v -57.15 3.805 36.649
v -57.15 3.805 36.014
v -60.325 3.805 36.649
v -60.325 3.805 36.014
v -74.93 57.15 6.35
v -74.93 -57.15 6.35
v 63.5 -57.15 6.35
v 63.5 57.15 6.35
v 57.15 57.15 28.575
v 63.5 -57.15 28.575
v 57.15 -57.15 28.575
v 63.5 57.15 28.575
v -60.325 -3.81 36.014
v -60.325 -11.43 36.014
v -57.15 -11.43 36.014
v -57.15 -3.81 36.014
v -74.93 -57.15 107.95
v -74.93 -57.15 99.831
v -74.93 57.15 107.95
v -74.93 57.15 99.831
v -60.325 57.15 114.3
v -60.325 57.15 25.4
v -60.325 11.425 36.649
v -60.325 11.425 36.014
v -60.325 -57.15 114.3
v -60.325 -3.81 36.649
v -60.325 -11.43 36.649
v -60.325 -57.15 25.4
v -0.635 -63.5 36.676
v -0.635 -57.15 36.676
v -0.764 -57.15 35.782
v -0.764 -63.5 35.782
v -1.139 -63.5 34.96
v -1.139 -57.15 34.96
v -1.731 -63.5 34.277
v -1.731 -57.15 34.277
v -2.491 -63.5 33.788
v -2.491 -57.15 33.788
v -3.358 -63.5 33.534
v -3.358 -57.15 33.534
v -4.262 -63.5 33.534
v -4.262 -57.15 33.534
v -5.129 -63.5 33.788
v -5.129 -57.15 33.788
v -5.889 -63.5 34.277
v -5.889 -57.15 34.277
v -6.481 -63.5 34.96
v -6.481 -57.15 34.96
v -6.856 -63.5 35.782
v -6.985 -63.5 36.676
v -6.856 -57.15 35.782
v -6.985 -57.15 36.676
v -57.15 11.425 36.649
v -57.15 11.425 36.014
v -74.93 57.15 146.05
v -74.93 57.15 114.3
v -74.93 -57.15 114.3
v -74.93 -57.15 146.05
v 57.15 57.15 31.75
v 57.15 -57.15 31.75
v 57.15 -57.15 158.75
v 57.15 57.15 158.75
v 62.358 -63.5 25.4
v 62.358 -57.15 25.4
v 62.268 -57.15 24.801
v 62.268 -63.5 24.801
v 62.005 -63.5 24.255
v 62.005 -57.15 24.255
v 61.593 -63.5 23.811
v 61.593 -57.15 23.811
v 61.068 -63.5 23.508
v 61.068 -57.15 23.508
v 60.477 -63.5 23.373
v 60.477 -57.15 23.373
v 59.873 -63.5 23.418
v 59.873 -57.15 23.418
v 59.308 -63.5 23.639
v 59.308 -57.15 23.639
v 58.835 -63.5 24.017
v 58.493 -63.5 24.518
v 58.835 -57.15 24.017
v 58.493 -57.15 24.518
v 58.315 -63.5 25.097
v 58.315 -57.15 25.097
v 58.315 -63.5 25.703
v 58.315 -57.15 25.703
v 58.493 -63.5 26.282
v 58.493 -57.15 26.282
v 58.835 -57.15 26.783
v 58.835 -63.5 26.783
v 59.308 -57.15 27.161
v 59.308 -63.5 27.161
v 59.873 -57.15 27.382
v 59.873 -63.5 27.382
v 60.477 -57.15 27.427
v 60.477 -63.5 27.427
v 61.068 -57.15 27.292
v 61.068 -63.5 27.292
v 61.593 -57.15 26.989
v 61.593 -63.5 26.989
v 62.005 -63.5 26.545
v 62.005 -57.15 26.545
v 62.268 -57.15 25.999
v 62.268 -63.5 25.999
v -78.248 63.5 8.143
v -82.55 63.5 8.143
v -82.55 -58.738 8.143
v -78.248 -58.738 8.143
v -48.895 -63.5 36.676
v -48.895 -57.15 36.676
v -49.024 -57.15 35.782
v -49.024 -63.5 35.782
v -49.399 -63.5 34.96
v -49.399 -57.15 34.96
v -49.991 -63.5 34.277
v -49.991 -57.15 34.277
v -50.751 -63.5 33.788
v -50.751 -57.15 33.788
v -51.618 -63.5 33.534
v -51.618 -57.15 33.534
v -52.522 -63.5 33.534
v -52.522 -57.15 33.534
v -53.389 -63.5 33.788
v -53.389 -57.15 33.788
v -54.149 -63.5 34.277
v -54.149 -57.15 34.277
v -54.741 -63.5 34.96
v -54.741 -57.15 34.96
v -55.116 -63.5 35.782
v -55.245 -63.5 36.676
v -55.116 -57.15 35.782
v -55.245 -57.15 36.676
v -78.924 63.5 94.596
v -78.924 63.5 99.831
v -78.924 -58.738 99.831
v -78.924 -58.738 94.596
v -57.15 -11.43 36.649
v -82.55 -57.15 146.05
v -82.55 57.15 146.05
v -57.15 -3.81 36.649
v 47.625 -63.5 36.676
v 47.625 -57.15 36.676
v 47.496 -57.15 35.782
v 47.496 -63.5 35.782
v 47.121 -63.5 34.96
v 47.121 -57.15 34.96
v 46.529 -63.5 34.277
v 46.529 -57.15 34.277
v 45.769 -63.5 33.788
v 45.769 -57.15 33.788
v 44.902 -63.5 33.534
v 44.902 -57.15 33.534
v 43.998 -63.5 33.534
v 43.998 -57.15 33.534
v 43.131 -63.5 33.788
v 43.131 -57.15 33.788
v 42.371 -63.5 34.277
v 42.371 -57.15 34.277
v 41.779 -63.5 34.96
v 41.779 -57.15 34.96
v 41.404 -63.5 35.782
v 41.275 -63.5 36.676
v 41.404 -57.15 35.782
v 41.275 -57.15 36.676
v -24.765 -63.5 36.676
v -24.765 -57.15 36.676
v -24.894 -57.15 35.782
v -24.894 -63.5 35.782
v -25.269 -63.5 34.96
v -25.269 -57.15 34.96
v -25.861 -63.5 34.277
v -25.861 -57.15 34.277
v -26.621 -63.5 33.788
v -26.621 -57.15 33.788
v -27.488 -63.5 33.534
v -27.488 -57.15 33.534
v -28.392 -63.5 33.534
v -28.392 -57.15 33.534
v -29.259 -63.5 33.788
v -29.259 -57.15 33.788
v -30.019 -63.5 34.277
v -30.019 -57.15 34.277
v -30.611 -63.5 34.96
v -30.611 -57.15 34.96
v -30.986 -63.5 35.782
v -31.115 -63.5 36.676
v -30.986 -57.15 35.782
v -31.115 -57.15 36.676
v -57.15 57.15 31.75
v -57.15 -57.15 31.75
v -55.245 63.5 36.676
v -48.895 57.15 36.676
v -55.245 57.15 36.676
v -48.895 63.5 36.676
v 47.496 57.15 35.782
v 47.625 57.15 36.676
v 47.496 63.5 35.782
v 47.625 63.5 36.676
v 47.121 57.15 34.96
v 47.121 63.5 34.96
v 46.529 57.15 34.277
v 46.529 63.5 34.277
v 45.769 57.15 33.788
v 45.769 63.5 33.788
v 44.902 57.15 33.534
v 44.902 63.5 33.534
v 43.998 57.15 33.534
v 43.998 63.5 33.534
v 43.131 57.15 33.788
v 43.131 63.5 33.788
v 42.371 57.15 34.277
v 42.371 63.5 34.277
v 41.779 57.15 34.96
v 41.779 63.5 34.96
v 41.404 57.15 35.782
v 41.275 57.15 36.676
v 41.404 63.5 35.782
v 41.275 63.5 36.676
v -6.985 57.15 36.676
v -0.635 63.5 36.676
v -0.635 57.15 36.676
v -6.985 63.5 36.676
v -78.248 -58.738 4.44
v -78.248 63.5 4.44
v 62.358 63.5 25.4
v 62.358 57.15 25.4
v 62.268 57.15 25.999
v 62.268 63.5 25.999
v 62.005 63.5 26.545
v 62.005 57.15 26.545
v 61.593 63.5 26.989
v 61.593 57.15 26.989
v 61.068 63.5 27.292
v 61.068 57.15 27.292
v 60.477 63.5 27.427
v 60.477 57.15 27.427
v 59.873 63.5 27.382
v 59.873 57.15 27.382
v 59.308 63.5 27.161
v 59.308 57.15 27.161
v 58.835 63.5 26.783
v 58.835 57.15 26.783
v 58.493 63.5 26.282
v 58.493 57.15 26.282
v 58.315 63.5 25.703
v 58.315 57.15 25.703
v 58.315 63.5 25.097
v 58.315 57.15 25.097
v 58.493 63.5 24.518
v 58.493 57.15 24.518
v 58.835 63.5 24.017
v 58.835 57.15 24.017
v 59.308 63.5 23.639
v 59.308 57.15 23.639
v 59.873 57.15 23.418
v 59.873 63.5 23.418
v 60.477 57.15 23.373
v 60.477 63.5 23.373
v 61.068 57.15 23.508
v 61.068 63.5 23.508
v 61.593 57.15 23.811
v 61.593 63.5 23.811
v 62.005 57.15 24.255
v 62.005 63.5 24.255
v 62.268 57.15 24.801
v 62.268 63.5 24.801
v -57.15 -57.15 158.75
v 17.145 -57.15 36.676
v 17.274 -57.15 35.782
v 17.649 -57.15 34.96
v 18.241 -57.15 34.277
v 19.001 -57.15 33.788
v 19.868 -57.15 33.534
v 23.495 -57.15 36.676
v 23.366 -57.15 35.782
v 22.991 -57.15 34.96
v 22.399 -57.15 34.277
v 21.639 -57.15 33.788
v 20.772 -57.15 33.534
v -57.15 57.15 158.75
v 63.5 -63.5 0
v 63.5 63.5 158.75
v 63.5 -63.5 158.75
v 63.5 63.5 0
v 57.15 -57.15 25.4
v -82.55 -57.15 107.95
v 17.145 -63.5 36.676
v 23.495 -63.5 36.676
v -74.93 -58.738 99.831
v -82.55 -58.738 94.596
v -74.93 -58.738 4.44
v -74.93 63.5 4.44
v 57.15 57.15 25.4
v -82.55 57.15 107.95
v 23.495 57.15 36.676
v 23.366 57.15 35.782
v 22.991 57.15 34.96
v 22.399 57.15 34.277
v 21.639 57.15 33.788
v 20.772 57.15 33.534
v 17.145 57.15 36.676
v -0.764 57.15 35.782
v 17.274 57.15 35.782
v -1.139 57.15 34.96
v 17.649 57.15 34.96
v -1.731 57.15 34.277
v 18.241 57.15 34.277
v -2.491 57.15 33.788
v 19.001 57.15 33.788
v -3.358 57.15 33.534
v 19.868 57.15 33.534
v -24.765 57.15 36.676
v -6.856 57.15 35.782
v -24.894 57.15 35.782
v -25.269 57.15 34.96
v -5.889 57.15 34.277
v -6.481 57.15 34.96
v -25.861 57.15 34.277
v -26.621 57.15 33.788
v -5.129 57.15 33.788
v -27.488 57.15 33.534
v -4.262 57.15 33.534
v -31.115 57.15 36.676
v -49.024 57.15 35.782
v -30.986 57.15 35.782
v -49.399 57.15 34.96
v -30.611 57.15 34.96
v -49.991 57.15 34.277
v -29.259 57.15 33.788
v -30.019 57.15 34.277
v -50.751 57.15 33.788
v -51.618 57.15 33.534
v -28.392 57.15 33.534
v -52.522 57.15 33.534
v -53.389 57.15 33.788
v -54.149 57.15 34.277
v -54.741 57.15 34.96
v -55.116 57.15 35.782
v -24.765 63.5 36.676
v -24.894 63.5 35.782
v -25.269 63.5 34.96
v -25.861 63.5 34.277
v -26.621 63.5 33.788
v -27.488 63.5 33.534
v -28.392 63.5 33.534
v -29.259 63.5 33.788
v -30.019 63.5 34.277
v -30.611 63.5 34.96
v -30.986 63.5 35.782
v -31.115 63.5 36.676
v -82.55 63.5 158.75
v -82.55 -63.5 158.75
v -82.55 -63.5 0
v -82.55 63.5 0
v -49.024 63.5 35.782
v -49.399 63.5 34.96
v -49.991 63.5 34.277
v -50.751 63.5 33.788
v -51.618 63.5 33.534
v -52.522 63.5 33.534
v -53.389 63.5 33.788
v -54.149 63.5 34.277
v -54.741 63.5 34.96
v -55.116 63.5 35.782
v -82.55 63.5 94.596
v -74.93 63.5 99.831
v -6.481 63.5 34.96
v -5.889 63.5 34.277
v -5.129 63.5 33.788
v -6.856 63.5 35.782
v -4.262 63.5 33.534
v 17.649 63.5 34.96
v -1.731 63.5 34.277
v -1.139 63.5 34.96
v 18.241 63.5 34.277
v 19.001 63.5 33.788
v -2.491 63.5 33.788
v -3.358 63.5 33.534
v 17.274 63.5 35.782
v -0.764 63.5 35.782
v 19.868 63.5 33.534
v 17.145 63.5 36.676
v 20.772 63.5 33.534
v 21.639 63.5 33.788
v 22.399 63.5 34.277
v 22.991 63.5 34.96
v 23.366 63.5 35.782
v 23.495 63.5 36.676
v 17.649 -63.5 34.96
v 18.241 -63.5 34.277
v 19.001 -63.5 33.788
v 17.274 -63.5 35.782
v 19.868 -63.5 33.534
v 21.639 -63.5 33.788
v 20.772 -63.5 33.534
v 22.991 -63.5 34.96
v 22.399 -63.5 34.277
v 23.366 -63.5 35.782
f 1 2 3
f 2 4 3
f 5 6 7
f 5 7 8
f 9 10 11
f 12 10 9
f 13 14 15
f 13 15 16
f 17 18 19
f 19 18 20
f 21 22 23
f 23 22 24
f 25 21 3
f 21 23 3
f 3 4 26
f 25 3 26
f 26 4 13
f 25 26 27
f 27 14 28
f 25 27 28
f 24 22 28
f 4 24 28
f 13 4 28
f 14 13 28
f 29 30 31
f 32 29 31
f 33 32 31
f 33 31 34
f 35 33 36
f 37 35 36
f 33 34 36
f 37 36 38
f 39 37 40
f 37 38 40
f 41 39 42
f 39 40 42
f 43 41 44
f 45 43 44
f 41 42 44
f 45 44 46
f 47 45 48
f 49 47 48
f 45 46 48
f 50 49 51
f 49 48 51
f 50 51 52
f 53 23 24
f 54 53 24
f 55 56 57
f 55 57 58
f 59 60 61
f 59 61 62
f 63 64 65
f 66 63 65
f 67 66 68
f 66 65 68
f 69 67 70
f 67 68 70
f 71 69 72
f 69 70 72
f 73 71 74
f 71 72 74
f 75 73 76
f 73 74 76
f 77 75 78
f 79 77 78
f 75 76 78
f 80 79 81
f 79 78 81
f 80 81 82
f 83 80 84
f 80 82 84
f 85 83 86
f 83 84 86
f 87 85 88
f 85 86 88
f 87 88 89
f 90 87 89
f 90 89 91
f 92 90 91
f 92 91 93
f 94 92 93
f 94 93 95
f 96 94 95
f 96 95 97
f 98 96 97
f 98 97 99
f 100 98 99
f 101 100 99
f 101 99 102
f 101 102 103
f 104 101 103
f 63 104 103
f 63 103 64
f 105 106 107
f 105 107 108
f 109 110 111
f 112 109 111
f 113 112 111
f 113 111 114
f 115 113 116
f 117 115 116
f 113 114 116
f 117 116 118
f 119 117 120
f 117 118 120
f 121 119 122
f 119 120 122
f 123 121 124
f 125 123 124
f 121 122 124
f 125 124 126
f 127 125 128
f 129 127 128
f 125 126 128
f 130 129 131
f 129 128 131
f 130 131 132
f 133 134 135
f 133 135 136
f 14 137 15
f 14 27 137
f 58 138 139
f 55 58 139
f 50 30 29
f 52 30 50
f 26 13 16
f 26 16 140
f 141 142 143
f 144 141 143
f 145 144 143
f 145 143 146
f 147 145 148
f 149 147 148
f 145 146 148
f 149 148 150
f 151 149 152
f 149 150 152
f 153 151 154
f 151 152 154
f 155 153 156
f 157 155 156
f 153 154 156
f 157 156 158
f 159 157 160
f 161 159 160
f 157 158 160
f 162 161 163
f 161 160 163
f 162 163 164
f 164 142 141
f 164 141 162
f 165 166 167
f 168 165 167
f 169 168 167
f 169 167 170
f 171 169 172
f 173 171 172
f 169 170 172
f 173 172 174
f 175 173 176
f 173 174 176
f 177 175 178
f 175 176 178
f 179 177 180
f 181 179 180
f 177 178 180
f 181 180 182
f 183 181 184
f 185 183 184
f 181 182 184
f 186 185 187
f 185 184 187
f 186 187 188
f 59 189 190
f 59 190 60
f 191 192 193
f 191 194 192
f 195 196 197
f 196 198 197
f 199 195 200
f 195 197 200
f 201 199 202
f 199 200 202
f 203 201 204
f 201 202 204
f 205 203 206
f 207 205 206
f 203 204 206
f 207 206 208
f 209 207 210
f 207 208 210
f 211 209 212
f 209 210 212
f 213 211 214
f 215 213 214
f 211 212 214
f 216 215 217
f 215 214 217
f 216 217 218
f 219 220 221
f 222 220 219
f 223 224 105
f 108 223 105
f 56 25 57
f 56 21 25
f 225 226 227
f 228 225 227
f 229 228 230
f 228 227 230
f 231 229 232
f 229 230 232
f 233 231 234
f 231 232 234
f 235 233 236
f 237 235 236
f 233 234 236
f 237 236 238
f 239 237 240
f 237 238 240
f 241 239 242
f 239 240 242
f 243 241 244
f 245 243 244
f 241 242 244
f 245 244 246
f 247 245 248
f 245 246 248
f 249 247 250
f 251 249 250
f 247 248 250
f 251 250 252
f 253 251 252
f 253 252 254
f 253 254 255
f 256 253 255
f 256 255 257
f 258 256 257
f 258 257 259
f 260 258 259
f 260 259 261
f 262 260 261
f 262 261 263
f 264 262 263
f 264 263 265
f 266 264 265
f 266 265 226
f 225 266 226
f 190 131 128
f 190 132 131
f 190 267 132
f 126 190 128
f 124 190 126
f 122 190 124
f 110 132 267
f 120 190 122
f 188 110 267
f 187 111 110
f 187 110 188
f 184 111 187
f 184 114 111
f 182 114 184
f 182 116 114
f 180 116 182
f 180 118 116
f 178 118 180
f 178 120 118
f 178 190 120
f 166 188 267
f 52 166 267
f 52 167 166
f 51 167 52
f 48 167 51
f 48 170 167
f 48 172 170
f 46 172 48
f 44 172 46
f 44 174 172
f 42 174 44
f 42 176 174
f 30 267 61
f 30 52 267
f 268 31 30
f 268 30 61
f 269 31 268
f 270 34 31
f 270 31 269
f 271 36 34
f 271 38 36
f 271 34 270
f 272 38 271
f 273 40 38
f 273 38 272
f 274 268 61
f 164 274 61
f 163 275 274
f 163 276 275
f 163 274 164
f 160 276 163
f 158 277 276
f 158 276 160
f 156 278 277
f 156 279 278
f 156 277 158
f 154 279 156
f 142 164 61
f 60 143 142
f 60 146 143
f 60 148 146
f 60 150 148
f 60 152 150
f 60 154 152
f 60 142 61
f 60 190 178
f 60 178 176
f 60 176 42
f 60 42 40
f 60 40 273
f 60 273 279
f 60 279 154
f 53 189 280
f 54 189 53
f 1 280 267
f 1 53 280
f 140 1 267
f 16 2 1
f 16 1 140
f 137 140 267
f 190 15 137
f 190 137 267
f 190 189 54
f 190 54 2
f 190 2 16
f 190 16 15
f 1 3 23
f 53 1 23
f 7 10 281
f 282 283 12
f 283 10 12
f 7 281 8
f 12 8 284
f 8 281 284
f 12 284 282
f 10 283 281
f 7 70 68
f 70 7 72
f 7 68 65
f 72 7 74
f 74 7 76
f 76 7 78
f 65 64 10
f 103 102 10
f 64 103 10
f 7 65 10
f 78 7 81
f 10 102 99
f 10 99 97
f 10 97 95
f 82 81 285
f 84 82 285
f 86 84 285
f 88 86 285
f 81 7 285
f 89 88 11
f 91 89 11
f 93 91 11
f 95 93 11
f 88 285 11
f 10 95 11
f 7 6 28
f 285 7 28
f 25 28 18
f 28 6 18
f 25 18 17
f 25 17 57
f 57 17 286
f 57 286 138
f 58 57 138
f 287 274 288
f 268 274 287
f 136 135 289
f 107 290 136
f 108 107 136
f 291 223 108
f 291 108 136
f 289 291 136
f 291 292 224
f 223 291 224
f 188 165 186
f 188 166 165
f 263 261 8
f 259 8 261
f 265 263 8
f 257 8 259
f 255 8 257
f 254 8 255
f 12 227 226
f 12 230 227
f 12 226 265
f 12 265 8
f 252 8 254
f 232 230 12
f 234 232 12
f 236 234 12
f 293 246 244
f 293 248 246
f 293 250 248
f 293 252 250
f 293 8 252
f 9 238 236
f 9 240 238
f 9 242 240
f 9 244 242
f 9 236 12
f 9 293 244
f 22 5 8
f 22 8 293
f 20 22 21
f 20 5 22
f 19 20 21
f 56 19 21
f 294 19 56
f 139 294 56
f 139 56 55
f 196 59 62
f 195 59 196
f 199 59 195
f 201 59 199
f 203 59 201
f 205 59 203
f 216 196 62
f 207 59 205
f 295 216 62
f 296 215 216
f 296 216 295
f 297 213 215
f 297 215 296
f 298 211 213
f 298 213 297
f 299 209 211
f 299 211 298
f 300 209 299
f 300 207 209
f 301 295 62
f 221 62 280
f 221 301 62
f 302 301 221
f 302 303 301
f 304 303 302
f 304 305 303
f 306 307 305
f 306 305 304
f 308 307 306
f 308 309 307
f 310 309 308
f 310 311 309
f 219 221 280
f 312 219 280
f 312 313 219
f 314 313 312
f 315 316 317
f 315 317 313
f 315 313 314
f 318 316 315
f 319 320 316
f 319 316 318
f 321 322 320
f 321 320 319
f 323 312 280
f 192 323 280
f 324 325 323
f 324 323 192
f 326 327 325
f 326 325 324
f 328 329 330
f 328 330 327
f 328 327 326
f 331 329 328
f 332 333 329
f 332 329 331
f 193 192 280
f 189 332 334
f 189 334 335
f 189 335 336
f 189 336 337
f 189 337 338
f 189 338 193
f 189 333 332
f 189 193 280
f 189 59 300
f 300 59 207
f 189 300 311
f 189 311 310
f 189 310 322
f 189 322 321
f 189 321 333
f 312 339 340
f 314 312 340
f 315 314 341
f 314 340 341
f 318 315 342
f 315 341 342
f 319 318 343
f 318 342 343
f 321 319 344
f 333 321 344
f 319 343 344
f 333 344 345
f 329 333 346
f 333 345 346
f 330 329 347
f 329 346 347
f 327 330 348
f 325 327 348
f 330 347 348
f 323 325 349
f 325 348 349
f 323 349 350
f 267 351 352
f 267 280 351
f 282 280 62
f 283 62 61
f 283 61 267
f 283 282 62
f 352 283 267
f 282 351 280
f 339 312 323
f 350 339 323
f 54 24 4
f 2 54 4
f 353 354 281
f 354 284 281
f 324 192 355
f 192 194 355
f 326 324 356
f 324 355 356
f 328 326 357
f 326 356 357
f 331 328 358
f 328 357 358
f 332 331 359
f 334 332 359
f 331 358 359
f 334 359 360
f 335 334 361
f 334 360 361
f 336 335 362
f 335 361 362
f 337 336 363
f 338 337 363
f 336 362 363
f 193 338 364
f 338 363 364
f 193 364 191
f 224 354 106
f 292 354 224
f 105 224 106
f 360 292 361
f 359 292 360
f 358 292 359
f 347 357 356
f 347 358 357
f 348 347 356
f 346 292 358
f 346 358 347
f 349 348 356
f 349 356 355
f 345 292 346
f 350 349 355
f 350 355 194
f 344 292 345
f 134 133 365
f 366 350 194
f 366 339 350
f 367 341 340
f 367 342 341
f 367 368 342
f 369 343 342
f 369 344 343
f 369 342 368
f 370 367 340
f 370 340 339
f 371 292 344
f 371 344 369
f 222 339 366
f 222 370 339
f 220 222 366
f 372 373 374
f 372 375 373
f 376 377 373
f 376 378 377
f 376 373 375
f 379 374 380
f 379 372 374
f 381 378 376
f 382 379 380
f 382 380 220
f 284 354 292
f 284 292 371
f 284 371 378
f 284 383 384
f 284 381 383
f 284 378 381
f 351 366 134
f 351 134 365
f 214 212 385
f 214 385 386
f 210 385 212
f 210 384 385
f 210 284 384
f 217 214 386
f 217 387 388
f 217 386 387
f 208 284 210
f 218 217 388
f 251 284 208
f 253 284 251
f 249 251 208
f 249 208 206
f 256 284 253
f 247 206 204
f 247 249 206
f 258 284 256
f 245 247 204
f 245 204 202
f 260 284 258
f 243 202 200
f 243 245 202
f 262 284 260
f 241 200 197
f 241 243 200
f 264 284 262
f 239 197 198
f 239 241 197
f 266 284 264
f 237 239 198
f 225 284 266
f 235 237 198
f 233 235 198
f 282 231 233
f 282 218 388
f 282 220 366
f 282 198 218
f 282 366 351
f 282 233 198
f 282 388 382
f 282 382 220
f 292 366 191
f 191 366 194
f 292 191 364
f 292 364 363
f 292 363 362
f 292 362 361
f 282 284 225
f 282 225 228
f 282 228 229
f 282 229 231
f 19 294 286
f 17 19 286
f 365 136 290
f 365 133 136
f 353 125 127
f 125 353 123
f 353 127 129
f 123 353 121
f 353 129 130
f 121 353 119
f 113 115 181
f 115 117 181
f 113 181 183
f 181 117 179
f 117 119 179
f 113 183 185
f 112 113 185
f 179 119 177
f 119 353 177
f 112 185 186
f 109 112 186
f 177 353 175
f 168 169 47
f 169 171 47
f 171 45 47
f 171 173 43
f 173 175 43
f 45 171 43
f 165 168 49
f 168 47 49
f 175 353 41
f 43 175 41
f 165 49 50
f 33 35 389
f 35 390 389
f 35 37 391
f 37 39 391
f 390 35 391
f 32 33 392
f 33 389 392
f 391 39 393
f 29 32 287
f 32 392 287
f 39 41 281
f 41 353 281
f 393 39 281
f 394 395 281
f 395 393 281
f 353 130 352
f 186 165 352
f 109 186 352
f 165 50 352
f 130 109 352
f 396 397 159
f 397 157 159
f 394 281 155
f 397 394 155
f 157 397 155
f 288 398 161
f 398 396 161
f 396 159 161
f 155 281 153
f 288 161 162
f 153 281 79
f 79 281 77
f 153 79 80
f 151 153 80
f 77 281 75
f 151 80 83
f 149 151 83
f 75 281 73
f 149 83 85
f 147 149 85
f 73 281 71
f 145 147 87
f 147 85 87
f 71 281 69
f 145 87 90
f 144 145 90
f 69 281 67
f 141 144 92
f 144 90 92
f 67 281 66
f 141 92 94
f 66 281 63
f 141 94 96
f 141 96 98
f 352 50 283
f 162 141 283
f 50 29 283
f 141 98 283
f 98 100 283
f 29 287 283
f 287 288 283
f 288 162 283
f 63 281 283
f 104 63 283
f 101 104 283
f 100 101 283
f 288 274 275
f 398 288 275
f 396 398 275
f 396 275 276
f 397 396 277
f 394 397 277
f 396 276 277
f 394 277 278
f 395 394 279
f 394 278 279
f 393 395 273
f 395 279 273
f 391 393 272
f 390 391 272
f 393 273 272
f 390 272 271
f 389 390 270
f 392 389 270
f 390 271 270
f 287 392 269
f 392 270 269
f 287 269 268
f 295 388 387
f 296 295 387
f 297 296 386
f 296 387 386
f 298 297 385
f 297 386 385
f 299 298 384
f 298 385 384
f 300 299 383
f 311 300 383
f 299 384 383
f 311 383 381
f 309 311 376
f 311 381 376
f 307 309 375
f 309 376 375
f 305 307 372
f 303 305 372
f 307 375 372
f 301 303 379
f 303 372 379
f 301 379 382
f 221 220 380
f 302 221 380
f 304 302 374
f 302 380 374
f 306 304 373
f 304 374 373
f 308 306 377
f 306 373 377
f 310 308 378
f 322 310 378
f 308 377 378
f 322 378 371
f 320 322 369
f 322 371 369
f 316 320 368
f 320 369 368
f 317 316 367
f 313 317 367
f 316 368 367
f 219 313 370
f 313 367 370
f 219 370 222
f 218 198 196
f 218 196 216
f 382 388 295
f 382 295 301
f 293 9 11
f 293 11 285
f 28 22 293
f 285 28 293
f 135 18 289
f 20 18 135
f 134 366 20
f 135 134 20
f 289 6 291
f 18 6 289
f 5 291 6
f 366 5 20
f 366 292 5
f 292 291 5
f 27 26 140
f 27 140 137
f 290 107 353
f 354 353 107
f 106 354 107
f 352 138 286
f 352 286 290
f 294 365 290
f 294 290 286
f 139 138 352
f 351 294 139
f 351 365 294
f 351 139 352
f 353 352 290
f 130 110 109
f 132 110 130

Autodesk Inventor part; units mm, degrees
ref_plane "YZ Plane" through (0, 0, 0) normal (1, 0, 0) x (0, 1, 0)
ref_plane "XZ Plane" through (0, 0, 0) normal (0, 1, 0) x (-1, 0, 0)
ref_plane "XY Plane" through (0, 0, 0) normal (0, 0, 1) x (1, 0, 0)
sketch "Sketch1" plane through (0, 0, 0) normal (0, 0, 1) x (1, 0, 0)
  circle A0 centre (0, 0) radius 107.95 projected
  circle A1 centre (0, 0) radius 114.3 projected
  circle A2 centre (0, 0) radius 107.95 projected
  circle A3 centre (0, 0) radius 107.95 projected
  line L0 (-63.5, -63.5) -> (63.5, -63.5)
  line L1 (63.5, -63.5) -> (63.5, 63.5)
  line L2 (63.5, 63.5) -> (-63.5, 63.5)
  line L3 (-63.5, 63.5) -> (-63.5, -63.5)
  line L4 (-63.5, -63.5) -> (63.5, 63.5) construction
  line L5 (63.5, -63.5) -> (-63.5, 63.5) construction
  line L6 (57.15, 57.15) -> (57.15, -57.15)
  line L7 (57.15, -57.15) -> (-57.15, -57.15)
  line L8 (-57.15, -57.15) -> (-57.15, 57.15)
  line L9 (-57.15, 57.15) -> (57.15, 57.15)
  dimension "d0" = 127
  dimension "d1" = 127
  dimension "d2" = 6.35
extrude "Extrusion1" add sketch "Sketch1" along normal blind 6.35 contours L3 L2 L1 L0 | L6 L7 L8 L9
sketch "Sketch2" plane through (0, 0, 6.35) normal (0, 0, 1) x (1, 0, 0)
  line L0 (63.5, -63.5) -> (63.5, 63.5) projected
  line L1 (-63.5, 63.5) -> (63.5, 63.5)
  line L2 (63.5, 63.5) -> (63.5, -63.5)
  line L3 (63.5, -63.5) -> (-63.5, -63.5)
  line L4 (-63.5, -63.5) -> (-63.5, 63.5)
  line L5 (-63.5, 63.5) -> (63.5, -63.5) construction
  line L6 (63.5, 63.5) -> (-63.5, -63.5) construction
  line L7 (-57.15, -57.15) -> (57.15, -57.15)
  line L8 (57.15, -57.15) -> (57.15, 57.15)
  line L9 (57.15, 57.15) -> (-57.15, 57.15)
  line L10 (-57.15, 57.15) -> (-57.15, -57.15)
  point P0 (0, 0)
  dimension "d5" = 6.35
extrude "Extrusion2" add sketch "Sketch2" along normal blind 152.4
sketch "Sketch3" plane through (-63.5, -63.5, 0) normal (-1, 0, 0) x (0, 0, 1)
  line L0 (0, 127) -> (0, 0) projected
  line L1 (0, 0) -> (158.75, 0) projected
  line L2 (158.75, 127) -> (158.75, 0) projected
  line L3 (0, 127) -> (158.75, 127) projected
  point P0 (0, 63.5)
extrude "Extrusion3" add sketch "Sketch3" along normal blind 19.05
sketch "Sketch4" plane through (-82.55, -63.5, 0) normal (-1, 0, 0) x (0, 0, 1)
  line L0 (107.95, 6.35) -> (146.05, 6.35)
  line L1 (146.05, 6.35) -> (146.05, 120.65)
  line L2 (146.05, 120.65) -> (107.95, 120.65)
  line L3 (107.95, 120.65) -> (107.95, 6.35)
  line L4 (107.95, 6.35) -> (146.05, 120.65) construction
  line L5 (146.05, 6.35) -> (107.95, 120.65) construction
  line L6 (158.75, 127) -> (0, 127) projected
  line L7 (0, 0) -> (158.75, 0) projected
  line L8 (158.75, 0) -> (158.75, 127) projected
  point P0 (0, 63.5)
  point P1 (127, 63.5)
  dimension "d10" = 38.1
  dimension "d11" = 114.3
  dimension "d12" = 6.35
  dimension "d13" = 6.35
  dimension "d14" = 12.7
extrude "Extrusion4" cut sketch "Sketch4" against normal blind 7.62
ref_plane "Work Plane1" through (0, 0, 25.4) normal (0, 0, 1) x (1, 0, 0)
sketch "Sketch6" plane through (0, 0, 25.4) normal (0, 0, 1) x (1, 0, 0)
  line L0 (-57.15, -57.15) -> (57.15, -57.15) projected
  line L1 (57.15, -57.15) -> (57.15, 57.15) projected
  line L2 (57.15, 57.15) -> (-57.15, 57.15) projected
  line L3 (-57.15, 57.15) -> (-57.15, -57.15) projected
  point P0 (0, 0)
extrude "Extrusion5" add sketch "Sketch6" along normal blind 6.35
sketch "Sketch7" plane through (63.5, 63.5, 158.75) normal (0, 1, 0) x (1, 0, 0)
  line L0 (-6.35, 133.35) -> (-120.65, 133.35) projected
  line L1 (-120.65, 127) -> (-6.35, 127) projected
  circle A0 centre (-19.05, 122.0738) radius 3.175
  circle A1 centre (-43.18, 122.0738) radius 3.175
  circle A2 centre (-67.31, 122.0738) radius 3.175
  circle A3 centre (-91.44, 122.0738) radius 3.175
  circle A4 centre (-115.57, 122.0738) radius 3.175
  line L2 (-15.875, 122.0738) -> (-22.225, 122.0738)
  line L3 (-40.005, 122.0738) -> (-46.355, 122.0738)
  line L4 (-64.135, 122.0738) -> (-70.485, 122.0738)
  line L5 (-88.265, 122.0738) -> (-94.615, 122.0738)
  line L6 (-112.395, 122.0738) -> (-118.745, 122.0738)
  point P0 (-63.5, 158.75)
  dimension "d20" = 6.35
  dimension "d21" = 12.7
  dimension "d24" = 24.13
extrude "Extrusion6" cut sketch "Sketch7" against normal blind 127 contours L2 A0 | L3 A1 | L4 A2 | L5 A3 | L6 A4 picked at (-18.2578, 122.7756) picked at (-43.0524, 123.1244) picked at (-66.7088, 122.9448) picked at (-90.8388, 122.9448) picked at (-114.8476, 123.4366)
sketch "Sketch8" plane through (63.5, -63.5, 0) normal (1, 0, 0) x (0, 0, -1)
  line L0 (-6.35, 120.65) -> (-25.4, 120.65) projected
  line L1 (-158.75, 6.35) -> (-6.35, 6.35)
  line L2 (-6.35, 120.65) -> (-158.75, 120.65)
  line L3 (-6.35, 120.65) -> (-6.35, 6.35) projected
  line L4 (-6.35, 6.35) -> (-6.35, 120.65)
  line L5 (-28.575, 6.35) -> (-28.575, 120.65)
  point P0 (0, 63.5)
  point P1 (-25.4, 6.35)
extrude "Extrusion7" cut sketch "Sketch8" against normal blind 6.35
sketch "Sketch9" plane through (-57.15, 57.15, 6.35) normal (0, -1, 0) x (1, 0, 0)
  circle A0 centre (117.475, 19.05) radius 2.033
  line L0 (114.3, 19.05) -> (0, 19.05) projected
  line L1 (0, 0) -> (0, 19.05) projected
  line L2 (120.65, 0) -> (0, 0) projected
  line L3 (120.65, 22.225) -> (120.65, 0) projected
  line L4 (120.65, 22.225) -> (114.3, 22.225) projected
  line L5 (114.3, 22.225) -> (114.3, 19.05) projected
  point P0 (57.15, -6.35)
  dimension "d34" = 3.175
  dimension "d35" = 3.175
extrude "Extrusion8" cut sketch "Sketch9" along normal mid plane 254 contours A0
sketch "Sketch10" plane through (0, 0, 0) normal (0, 0, -1) x (-1, 0, 0)
  line L0 (57.15, 57.15) -> (57.15, -57.15) projected
  line L1 (74.93, -57.15) -> (74.93, 57.15) projected
  line L2 (57.15, 57.15) -> (74.93, 57.15)
  line L3 (82.55, -57.15) -> (74.93, -57.15) projected
  line L4 (57.15, -57.15) -> (74.93, -57.15)
  line L5 (60.325, 57.15) -> (60.325, -57.15)
  point P0 (0, 0)
  dimension "d40" = 3.175
extrude "Extrusion9" cut sketch "Sketch10" against normal blind 114.3 contours L2 L1 L4 L5
sketch "Sketch11" plane through (-82.55, -63.5, 0) normal (-1, 0, 0) x (0, 0, 1)
  line L0 (6.35, 120.65) -> (6.35, 6.35) projected
  line L1 (6.35, 120.65) -> (6.35, 6.35)
  line L2 (25.4, 120.65) -> (25.4, 6.35) projected
  line L3 (6.35, 6.35) -> (25.4, 6.35)
  line L4 (6.35, 120.65) -> (25.4, 120.65) projected
  line L5 (25.4, 120.65) -> (6.35, 120.65)
  point P0 (0, 63.5)
extrude "Extrusion10" cut sketch "Sketch11" against normal blind 42.8625
sketch "Sketch12" plane through (-60.325, -57.15, 0) normal (-1, 0, 0) x (0, 0, 1)
  point P0 (0, 57.15)
sketch "Sketch13" plane through (-60.325, -57.15, 0) normal (-1, 0, 0) x (0, 0, 1)
  line L0 (0, 114.3) -> (6.35, 114.3) projected
  line L1 (6.35, 114.3) -> (0, 114.3)
  line L2 (0, 114.3) -> (0, -0.7007)
  line L3 (0, 120.65) -> (0, -6.35) projected
  line L4 (0, 0) -> (6.35, 0) projected
  line L5 (6.35, 0) -> (6.35, 114.3)
  point P0 (0, 57.15)
extrude "Extrusion11" add sketch "Sketch13" along normal blind 22.225
sketch "Sketch14" plane through (-82.55, -57.15, 25.4) normal (0, 0, -1) x (-1, 0, 0)
  line L0 (0, 114.3) -> (0, 0) projected
  line L1 (0, 114.3) -> (-7.62, 114.3) projected
  line L2 (0, 114.3) -> (-7.62, 114.3)
  line L3 (-7.62, 0) -> (-7.62, 114.3) projected
  line L4 (-7.62, 114.3) -> (-7.62, 0)
  line L5 (0, 0) -> (-7.62, 0) projected
  line L6 (-7.62, 0) -> (0, 0)
  line L7 (0, 0) -> (0, 114.3)
  point P0 (-82.55, 57.15)
extrude "Extrusion12" add sketch "Sketch14" along normal blind 22.225
sketch "Sketch16" plane through (63.5, 63.5, 158.75) normal (0, 1, 0) x (1, 0, 0)
  line L0 (-138.43, 152.4) -> (-138.43, 50.8) projected
  line L1 (-138.43, 58.9187) -> (-142.4244, 58.9187)
  line L2 (-142.4244, 58.9187) -> (-142.4244, 64.1535)
  line L3 (-142.4244, 64.1535) -> (-146.05, 64.1535)
  line L4 (-146.05, 158.75) -> (-146.05, 0) projected
  line L5 (-146.05, 150.6067) -> (-137.3483, 150.6067)
  line L6 (-137.3483, 150.6067) -> (-137.3483, 58.9187)
  line L7 (-137.3483, 58.9187) -> (-138.43, 58.9187)
  point P0 (-63.5, 158.75)
  point P1 (-138.43, 150.6067)
extrude "Extrusion13" cut sketch "Sketch16" against normal blind 122.2375 contours L0 L1 L2 L3 L4 L5
sketch "Sketch17" plane through (63.5, 63.5, 158.75) normal (0, 1, 0) x (1, 0, 0)
  line L0 (-138.43, 150.6067) -> (-138.43, 154.3098)
  line L1 (-138.43, 154.3098) -> (-141.7479, 154.3098)
  line L2 (-141.7479, 154.3098) -> (-141.7479, 150.6067)
  line L3 (-146.05, 150.6067) -> (-138.43, 150.6067) projected
  point P0 (-63.5, 158.75)
extrude "Extrusion14" cut sketch "Sketch17" against normal blind 122.2375
sketch "Sketch19" plane through (-60.325, -57.15, 25.4) normal (-1, 0, 0) x (0, 0, 1)
  line L0 (10.614, 53.34) -> (11.249, 53.34)
  line L1 (11.249, 53.34) -> (11.249, 45.72)
  line L2 (11.249, 45.72) -> (10.614, 45.72)
  line L3 (10.614, 45.72) -> (10.614, 53.34)
  line L4 (10.614, 60.9551) -> (11.249, 60.9551)
  line L5 (11.249, 60.9551) -> (11.249, 68.5751)
  line L6 (11.249, 68.5751) -> (10.614, 68.5751)
  line L7 (10.614, 68.5751) -> (10.614, 60.9551)
  point P0 (-25.4, 57.15)
  dimension "d53" = 0.635
  dimension "d54" = 7.62
  dimension "d55" = 0.635
  dimension "d56" = 7.62
  dimension "d57" = 0.635
extrude "Extrusion15" cut sketch "Sketch19" against normal blind 47.625
properties part number "SqPot"
